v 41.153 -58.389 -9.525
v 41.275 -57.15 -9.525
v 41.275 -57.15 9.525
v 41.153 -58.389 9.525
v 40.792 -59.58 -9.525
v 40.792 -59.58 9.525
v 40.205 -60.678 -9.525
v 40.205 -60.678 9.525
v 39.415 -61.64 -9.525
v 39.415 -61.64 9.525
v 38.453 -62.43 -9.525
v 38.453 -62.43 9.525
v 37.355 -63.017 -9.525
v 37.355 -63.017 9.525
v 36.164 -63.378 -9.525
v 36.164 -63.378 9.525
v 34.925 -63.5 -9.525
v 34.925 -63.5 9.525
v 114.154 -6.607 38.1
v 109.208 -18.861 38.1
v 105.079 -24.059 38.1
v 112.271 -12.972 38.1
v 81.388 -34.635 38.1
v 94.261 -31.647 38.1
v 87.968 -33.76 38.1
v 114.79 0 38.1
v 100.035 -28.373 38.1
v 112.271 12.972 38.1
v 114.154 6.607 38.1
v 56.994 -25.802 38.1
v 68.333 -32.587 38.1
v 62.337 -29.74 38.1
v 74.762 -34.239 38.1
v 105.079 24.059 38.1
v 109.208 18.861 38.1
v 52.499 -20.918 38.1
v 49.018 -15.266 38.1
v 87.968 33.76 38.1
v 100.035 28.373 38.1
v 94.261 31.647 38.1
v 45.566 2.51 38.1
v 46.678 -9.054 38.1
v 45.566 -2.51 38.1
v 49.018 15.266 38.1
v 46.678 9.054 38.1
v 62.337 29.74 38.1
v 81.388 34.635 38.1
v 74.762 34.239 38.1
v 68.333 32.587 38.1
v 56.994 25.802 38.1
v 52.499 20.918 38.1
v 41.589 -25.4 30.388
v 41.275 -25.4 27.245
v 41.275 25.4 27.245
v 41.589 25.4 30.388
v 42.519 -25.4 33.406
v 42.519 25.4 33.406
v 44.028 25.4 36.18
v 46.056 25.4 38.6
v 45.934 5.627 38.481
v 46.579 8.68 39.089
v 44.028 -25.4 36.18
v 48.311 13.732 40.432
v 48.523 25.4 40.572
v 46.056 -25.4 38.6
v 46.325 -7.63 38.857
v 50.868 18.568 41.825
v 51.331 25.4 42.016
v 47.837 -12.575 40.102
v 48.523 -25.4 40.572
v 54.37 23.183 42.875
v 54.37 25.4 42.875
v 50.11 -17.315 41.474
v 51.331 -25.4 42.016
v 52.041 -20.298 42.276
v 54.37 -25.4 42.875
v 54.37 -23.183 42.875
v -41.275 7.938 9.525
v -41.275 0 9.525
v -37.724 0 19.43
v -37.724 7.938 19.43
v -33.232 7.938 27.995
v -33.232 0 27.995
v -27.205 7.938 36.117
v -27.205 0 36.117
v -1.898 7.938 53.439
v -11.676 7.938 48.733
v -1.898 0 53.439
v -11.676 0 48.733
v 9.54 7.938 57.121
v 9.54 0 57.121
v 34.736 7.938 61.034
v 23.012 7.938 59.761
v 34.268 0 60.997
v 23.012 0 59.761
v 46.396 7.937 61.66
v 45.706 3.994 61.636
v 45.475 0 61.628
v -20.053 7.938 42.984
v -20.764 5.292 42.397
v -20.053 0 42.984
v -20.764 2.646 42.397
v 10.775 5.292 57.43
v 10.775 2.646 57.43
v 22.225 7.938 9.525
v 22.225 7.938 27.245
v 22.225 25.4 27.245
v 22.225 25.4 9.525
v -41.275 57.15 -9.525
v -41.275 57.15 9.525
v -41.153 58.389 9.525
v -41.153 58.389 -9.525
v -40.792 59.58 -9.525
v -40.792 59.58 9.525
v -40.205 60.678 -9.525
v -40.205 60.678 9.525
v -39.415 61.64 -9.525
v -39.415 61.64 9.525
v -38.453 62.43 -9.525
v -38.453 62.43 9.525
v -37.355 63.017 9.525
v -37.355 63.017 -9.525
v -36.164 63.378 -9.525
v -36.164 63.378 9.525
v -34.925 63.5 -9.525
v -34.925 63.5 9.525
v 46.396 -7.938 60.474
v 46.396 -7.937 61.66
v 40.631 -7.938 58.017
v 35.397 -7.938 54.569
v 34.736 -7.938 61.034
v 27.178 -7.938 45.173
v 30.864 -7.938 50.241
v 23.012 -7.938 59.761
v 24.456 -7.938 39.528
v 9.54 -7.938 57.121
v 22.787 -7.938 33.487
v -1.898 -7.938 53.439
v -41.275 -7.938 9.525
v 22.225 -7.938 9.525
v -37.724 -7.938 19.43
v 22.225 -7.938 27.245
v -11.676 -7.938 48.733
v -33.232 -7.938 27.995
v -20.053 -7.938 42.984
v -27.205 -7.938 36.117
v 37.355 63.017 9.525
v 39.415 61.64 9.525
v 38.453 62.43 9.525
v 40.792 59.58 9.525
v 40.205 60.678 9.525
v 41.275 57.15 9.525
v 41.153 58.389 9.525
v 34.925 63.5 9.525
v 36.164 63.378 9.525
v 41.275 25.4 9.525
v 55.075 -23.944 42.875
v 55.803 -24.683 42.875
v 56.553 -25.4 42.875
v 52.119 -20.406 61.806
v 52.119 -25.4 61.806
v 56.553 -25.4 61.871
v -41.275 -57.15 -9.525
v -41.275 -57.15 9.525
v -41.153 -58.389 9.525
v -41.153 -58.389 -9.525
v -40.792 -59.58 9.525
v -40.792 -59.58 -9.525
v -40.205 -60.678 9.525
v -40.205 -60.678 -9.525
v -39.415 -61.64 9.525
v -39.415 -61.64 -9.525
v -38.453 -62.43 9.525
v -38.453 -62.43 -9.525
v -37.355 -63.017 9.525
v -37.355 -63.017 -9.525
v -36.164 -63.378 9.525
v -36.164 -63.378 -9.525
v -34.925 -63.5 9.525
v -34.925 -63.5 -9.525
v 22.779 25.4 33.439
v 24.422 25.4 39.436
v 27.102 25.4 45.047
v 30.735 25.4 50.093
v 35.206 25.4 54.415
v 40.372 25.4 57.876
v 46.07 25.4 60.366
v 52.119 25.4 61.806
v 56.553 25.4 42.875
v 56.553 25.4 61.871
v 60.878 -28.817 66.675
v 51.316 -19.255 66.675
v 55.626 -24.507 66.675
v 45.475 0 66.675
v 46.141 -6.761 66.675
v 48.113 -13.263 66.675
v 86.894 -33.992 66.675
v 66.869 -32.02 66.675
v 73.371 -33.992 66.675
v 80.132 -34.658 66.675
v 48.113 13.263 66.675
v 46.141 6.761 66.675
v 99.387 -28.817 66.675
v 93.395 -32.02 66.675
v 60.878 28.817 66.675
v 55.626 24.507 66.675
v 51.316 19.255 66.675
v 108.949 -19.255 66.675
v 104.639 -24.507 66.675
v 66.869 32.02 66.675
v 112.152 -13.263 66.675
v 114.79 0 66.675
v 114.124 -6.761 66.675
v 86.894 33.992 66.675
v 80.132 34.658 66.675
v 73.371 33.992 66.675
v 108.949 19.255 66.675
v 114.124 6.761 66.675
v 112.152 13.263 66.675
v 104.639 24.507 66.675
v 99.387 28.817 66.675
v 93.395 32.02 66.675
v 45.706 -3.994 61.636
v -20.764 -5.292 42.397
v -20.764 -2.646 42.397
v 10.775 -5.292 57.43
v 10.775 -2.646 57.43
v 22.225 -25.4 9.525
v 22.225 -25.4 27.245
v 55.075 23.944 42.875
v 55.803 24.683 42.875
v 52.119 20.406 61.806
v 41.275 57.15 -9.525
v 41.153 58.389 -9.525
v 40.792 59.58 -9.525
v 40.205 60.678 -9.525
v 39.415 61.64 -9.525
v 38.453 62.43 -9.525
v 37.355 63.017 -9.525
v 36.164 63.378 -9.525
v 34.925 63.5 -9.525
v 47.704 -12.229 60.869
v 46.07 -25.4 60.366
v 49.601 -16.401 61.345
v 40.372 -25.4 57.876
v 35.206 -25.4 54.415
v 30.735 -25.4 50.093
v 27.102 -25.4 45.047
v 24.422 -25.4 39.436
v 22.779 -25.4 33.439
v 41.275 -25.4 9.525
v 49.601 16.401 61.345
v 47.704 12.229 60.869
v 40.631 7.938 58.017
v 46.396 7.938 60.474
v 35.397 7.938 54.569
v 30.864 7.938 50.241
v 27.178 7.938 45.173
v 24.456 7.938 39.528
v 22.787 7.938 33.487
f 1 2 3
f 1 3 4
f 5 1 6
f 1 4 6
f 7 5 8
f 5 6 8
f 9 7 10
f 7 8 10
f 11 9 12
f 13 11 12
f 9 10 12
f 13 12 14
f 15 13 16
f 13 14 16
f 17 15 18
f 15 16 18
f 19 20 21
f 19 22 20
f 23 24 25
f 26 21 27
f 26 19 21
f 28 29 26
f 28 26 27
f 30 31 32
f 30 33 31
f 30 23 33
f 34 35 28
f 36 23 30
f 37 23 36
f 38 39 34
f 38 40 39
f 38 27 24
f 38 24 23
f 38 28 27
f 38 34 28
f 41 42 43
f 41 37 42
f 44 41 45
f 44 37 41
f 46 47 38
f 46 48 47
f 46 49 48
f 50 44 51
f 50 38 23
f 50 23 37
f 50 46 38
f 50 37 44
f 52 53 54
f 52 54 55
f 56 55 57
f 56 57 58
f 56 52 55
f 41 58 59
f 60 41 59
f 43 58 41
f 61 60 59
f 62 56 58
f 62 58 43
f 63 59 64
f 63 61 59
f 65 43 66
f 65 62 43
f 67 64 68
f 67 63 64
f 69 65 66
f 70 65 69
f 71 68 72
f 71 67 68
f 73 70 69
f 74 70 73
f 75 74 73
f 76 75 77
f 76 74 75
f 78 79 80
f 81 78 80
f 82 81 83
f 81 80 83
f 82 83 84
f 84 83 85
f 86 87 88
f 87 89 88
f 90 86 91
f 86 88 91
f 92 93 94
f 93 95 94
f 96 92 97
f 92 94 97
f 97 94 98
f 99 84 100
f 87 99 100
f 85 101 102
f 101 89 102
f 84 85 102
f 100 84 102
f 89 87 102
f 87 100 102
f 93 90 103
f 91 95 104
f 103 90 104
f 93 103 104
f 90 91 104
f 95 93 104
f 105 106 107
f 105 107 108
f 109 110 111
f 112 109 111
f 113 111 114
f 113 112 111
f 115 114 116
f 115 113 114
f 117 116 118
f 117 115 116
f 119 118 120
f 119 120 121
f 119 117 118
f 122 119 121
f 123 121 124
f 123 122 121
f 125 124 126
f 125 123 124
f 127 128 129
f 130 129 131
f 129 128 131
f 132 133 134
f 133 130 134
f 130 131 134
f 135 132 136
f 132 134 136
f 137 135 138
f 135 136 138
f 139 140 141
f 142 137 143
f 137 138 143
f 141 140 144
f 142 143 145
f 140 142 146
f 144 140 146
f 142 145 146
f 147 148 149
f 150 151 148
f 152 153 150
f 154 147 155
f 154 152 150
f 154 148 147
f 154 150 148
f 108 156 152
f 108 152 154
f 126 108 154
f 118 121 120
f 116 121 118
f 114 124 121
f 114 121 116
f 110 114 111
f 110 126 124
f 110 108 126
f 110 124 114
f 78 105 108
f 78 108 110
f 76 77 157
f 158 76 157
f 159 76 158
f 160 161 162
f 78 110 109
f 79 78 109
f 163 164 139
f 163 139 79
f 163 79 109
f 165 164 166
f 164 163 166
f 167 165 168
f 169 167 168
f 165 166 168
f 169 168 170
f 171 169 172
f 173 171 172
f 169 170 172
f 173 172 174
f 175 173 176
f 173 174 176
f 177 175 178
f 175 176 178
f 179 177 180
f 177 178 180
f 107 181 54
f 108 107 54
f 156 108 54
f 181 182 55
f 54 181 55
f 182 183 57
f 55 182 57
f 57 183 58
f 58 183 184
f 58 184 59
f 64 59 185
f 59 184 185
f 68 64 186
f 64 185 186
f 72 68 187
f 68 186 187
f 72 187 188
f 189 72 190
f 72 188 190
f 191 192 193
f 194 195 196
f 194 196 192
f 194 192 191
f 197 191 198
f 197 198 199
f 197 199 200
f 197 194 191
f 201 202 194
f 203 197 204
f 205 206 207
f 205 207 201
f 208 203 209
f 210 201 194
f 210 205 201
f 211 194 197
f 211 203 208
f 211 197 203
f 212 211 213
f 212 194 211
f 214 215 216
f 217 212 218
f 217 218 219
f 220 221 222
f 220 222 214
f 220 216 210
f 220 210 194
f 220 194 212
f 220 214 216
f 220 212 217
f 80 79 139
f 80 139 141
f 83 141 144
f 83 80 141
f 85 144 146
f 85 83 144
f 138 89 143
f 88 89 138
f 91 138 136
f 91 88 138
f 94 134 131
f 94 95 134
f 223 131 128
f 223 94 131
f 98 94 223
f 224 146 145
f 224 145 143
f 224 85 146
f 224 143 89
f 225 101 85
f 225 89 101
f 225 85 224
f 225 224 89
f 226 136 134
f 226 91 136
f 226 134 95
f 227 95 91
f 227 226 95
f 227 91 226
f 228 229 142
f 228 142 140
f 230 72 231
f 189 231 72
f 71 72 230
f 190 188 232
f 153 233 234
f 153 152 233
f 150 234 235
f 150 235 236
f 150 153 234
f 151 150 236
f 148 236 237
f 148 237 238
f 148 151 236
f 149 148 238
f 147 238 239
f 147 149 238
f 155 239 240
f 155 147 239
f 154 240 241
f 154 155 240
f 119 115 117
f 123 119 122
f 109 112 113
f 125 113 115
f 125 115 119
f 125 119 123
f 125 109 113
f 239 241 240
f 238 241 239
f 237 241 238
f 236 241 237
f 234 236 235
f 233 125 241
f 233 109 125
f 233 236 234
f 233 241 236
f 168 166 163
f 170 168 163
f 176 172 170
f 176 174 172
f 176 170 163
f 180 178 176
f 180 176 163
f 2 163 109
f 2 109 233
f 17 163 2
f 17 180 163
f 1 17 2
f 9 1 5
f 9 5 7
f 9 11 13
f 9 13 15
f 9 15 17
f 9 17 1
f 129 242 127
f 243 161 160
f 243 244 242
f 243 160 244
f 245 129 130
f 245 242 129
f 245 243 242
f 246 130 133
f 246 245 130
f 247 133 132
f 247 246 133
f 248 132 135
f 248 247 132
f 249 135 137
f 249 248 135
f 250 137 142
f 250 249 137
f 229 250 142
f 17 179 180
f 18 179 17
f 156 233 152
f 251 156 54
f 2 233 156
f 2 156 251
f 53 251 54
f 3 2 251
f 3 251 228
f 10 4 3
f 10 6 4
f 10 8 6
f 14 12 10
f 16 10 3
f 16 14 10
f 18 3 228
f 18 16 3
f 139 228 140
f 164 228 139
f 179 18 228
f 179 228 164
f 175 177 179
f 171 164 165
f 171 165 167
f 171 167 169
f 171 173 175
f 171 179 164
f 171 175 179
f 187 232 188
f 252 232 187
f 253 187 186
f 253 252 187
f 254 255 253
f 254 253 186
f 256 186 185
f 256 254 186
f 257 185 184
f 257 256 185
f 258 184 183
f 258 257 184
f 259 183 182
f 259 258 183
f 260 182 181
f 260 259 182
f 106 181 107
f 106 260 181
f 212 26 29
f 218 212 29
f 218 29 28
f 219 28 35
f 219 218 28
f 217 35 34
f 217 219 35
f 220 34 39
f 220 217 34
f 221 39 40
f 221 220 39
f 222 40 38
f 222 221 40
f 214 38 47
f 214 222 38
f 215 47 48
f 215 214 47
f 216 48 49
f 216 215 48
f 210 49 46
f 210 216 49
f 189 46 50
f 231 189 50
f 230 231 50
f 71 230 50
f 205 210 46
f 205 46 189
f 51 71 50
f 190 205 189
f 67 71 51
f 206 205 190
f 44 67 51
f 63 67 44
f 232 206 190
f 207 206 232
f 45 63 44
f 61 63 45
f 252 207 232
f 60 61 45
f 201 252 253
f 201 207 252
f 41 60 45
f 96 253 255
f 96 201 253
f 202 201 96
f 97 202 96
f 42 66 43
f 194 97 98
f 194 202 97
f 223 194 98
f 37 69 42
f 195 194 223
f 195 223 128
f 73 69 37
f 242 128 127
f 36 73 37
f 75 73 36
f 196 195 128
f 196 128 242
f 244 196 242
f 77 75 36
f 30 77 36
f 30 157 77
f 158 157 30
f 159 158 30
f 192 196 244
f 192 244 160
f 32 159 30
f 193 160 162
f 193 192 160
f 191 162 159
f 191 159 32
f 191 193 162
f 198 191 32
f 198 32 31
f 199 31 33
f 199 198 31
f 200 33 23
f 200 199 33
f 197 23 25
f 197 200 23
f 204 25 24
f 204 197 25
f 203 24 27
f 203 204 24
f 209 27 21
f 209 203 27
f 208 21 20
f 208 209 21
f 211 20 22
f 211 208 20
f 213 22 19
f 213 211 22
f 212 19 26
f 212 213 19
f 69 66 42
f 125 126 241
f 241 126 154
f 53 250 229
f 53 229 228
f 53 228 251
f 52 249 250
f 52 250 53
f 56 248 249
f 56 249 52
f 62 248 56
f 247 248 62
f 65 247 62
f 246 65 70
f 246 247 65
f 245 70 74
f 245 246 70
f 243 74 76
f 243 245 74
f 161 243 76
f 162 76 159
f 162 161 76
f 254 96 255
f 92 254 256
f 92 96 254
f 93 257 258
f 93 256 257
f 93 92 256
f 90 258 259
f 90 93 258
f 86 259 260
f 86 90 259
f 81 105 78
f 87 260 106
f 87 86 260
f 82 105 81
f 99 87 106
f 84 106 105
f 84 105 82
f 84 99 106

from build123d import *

# Parameters (mm, degrees)
F1_DEPTH = 63.5
F0_W     = 16.14231
F0_H     = 19.05
F2_DEPTH = 25.4
F3_DEPTH = 7.9375
F5_R     = 6.35


with BuildPart() as f1:
    # F0 (on Front) → F1 (new body, symmetric)
    with BuildSketch(Plane.XZ):
        Polygon((22.225, 9.525), (-41.275, 9.525), (-41.275, -9.525), (41.275, -9.525), (41.275, 9.525), align=None)
    extrude(amount=F1_DEPTH, both=True)

    # F0 (on Front) → F2 (join, symmetric)
    with BuildSketch(Plane.XZ):
        with BuildLine():
            Line((22.225, 27.245483), (22.225, 9.525))
            Line((22.225, 9.525), (41.275, 9.525))
            Line((41.275, 9.525), (41.275, 27.245483))
            ThreePointArc((41.275, 27.245483), (44.98148, 37.440715), (54.37015, 42.8752))
            Line((54.37015, 42.8752), (63.990081, 42.8752))
            Line((63.990081, 42.8752), (63.990081, 61.9252))
            add(Edge.make_bspline(
                [(52.118676, 61.806174), (56.173728, 61.882453), (60.147361, 61.905409), (63.990081, 61.9252)],
                knots=[105.880796, 105.880796, 105.880796, 105.880796, 117.586216, 117.586216, 117.586216, 117.586216], degree=3))
            ThreePointArc((52.118676, 61.806174), (30.735282, 50.093203), (22.225, 27.245483))
        make_face()
        with Locations((72.061236, 52.4002)):
            Rectangle(F0_W, F0_H)
    extrude(amount=F2_DEPTH, both=True)

    # F0 (on Front) → F3 (join, symmetric)
    with BuildSketch(Plane.XZ):
        with BuildLine():
            add(Edge.make_bspline(
                [(-41.275, 9.525), (-27.902543, 56.063321), (15.438907, 61.1162), (52.118676, 61.806174)],
                knots=[0, 0, 0, 0, 105.880796, 105.880796, 105.880796, 105.880796], degree=3))
            Line((-41.275, 9.525), (22.225, 9.525))
            Line((22.225, 9.525), (22.225, 27.245483))
            ThreePointArc((22.225, 27.245483), (30.735282, 50.093203), (52.118676, 61.806174))
        make_face()
    extrude(amount=F3_DEPTH, both=True)

    # F0 (on Front) → F4 (revolve)
    with BuildSketch(Plane.XZ):
        Polygon((80.132391, 66.675), (80.132391, 61.9252), (80.132391, 42.8752), (80.132391, 38.1), (114.790081, 38.1), (114.790081, 66.675), align=None)
    revolve(axis=Axis((80.132391, 0, 52.3875), (0, 0, 1)))

    # F5
    f5_edges = [f1.edges().sort_by_distance(p)[0] for p in [
        (41.275, 63.5, 0),
        (-41.275, 63.5, 0),
        (-41.275, -63.5, 0),
        (41.275, -63.5, 0),
    ]]
    fillet(f5_edges, radius=F5_R)


solid = f1.part
